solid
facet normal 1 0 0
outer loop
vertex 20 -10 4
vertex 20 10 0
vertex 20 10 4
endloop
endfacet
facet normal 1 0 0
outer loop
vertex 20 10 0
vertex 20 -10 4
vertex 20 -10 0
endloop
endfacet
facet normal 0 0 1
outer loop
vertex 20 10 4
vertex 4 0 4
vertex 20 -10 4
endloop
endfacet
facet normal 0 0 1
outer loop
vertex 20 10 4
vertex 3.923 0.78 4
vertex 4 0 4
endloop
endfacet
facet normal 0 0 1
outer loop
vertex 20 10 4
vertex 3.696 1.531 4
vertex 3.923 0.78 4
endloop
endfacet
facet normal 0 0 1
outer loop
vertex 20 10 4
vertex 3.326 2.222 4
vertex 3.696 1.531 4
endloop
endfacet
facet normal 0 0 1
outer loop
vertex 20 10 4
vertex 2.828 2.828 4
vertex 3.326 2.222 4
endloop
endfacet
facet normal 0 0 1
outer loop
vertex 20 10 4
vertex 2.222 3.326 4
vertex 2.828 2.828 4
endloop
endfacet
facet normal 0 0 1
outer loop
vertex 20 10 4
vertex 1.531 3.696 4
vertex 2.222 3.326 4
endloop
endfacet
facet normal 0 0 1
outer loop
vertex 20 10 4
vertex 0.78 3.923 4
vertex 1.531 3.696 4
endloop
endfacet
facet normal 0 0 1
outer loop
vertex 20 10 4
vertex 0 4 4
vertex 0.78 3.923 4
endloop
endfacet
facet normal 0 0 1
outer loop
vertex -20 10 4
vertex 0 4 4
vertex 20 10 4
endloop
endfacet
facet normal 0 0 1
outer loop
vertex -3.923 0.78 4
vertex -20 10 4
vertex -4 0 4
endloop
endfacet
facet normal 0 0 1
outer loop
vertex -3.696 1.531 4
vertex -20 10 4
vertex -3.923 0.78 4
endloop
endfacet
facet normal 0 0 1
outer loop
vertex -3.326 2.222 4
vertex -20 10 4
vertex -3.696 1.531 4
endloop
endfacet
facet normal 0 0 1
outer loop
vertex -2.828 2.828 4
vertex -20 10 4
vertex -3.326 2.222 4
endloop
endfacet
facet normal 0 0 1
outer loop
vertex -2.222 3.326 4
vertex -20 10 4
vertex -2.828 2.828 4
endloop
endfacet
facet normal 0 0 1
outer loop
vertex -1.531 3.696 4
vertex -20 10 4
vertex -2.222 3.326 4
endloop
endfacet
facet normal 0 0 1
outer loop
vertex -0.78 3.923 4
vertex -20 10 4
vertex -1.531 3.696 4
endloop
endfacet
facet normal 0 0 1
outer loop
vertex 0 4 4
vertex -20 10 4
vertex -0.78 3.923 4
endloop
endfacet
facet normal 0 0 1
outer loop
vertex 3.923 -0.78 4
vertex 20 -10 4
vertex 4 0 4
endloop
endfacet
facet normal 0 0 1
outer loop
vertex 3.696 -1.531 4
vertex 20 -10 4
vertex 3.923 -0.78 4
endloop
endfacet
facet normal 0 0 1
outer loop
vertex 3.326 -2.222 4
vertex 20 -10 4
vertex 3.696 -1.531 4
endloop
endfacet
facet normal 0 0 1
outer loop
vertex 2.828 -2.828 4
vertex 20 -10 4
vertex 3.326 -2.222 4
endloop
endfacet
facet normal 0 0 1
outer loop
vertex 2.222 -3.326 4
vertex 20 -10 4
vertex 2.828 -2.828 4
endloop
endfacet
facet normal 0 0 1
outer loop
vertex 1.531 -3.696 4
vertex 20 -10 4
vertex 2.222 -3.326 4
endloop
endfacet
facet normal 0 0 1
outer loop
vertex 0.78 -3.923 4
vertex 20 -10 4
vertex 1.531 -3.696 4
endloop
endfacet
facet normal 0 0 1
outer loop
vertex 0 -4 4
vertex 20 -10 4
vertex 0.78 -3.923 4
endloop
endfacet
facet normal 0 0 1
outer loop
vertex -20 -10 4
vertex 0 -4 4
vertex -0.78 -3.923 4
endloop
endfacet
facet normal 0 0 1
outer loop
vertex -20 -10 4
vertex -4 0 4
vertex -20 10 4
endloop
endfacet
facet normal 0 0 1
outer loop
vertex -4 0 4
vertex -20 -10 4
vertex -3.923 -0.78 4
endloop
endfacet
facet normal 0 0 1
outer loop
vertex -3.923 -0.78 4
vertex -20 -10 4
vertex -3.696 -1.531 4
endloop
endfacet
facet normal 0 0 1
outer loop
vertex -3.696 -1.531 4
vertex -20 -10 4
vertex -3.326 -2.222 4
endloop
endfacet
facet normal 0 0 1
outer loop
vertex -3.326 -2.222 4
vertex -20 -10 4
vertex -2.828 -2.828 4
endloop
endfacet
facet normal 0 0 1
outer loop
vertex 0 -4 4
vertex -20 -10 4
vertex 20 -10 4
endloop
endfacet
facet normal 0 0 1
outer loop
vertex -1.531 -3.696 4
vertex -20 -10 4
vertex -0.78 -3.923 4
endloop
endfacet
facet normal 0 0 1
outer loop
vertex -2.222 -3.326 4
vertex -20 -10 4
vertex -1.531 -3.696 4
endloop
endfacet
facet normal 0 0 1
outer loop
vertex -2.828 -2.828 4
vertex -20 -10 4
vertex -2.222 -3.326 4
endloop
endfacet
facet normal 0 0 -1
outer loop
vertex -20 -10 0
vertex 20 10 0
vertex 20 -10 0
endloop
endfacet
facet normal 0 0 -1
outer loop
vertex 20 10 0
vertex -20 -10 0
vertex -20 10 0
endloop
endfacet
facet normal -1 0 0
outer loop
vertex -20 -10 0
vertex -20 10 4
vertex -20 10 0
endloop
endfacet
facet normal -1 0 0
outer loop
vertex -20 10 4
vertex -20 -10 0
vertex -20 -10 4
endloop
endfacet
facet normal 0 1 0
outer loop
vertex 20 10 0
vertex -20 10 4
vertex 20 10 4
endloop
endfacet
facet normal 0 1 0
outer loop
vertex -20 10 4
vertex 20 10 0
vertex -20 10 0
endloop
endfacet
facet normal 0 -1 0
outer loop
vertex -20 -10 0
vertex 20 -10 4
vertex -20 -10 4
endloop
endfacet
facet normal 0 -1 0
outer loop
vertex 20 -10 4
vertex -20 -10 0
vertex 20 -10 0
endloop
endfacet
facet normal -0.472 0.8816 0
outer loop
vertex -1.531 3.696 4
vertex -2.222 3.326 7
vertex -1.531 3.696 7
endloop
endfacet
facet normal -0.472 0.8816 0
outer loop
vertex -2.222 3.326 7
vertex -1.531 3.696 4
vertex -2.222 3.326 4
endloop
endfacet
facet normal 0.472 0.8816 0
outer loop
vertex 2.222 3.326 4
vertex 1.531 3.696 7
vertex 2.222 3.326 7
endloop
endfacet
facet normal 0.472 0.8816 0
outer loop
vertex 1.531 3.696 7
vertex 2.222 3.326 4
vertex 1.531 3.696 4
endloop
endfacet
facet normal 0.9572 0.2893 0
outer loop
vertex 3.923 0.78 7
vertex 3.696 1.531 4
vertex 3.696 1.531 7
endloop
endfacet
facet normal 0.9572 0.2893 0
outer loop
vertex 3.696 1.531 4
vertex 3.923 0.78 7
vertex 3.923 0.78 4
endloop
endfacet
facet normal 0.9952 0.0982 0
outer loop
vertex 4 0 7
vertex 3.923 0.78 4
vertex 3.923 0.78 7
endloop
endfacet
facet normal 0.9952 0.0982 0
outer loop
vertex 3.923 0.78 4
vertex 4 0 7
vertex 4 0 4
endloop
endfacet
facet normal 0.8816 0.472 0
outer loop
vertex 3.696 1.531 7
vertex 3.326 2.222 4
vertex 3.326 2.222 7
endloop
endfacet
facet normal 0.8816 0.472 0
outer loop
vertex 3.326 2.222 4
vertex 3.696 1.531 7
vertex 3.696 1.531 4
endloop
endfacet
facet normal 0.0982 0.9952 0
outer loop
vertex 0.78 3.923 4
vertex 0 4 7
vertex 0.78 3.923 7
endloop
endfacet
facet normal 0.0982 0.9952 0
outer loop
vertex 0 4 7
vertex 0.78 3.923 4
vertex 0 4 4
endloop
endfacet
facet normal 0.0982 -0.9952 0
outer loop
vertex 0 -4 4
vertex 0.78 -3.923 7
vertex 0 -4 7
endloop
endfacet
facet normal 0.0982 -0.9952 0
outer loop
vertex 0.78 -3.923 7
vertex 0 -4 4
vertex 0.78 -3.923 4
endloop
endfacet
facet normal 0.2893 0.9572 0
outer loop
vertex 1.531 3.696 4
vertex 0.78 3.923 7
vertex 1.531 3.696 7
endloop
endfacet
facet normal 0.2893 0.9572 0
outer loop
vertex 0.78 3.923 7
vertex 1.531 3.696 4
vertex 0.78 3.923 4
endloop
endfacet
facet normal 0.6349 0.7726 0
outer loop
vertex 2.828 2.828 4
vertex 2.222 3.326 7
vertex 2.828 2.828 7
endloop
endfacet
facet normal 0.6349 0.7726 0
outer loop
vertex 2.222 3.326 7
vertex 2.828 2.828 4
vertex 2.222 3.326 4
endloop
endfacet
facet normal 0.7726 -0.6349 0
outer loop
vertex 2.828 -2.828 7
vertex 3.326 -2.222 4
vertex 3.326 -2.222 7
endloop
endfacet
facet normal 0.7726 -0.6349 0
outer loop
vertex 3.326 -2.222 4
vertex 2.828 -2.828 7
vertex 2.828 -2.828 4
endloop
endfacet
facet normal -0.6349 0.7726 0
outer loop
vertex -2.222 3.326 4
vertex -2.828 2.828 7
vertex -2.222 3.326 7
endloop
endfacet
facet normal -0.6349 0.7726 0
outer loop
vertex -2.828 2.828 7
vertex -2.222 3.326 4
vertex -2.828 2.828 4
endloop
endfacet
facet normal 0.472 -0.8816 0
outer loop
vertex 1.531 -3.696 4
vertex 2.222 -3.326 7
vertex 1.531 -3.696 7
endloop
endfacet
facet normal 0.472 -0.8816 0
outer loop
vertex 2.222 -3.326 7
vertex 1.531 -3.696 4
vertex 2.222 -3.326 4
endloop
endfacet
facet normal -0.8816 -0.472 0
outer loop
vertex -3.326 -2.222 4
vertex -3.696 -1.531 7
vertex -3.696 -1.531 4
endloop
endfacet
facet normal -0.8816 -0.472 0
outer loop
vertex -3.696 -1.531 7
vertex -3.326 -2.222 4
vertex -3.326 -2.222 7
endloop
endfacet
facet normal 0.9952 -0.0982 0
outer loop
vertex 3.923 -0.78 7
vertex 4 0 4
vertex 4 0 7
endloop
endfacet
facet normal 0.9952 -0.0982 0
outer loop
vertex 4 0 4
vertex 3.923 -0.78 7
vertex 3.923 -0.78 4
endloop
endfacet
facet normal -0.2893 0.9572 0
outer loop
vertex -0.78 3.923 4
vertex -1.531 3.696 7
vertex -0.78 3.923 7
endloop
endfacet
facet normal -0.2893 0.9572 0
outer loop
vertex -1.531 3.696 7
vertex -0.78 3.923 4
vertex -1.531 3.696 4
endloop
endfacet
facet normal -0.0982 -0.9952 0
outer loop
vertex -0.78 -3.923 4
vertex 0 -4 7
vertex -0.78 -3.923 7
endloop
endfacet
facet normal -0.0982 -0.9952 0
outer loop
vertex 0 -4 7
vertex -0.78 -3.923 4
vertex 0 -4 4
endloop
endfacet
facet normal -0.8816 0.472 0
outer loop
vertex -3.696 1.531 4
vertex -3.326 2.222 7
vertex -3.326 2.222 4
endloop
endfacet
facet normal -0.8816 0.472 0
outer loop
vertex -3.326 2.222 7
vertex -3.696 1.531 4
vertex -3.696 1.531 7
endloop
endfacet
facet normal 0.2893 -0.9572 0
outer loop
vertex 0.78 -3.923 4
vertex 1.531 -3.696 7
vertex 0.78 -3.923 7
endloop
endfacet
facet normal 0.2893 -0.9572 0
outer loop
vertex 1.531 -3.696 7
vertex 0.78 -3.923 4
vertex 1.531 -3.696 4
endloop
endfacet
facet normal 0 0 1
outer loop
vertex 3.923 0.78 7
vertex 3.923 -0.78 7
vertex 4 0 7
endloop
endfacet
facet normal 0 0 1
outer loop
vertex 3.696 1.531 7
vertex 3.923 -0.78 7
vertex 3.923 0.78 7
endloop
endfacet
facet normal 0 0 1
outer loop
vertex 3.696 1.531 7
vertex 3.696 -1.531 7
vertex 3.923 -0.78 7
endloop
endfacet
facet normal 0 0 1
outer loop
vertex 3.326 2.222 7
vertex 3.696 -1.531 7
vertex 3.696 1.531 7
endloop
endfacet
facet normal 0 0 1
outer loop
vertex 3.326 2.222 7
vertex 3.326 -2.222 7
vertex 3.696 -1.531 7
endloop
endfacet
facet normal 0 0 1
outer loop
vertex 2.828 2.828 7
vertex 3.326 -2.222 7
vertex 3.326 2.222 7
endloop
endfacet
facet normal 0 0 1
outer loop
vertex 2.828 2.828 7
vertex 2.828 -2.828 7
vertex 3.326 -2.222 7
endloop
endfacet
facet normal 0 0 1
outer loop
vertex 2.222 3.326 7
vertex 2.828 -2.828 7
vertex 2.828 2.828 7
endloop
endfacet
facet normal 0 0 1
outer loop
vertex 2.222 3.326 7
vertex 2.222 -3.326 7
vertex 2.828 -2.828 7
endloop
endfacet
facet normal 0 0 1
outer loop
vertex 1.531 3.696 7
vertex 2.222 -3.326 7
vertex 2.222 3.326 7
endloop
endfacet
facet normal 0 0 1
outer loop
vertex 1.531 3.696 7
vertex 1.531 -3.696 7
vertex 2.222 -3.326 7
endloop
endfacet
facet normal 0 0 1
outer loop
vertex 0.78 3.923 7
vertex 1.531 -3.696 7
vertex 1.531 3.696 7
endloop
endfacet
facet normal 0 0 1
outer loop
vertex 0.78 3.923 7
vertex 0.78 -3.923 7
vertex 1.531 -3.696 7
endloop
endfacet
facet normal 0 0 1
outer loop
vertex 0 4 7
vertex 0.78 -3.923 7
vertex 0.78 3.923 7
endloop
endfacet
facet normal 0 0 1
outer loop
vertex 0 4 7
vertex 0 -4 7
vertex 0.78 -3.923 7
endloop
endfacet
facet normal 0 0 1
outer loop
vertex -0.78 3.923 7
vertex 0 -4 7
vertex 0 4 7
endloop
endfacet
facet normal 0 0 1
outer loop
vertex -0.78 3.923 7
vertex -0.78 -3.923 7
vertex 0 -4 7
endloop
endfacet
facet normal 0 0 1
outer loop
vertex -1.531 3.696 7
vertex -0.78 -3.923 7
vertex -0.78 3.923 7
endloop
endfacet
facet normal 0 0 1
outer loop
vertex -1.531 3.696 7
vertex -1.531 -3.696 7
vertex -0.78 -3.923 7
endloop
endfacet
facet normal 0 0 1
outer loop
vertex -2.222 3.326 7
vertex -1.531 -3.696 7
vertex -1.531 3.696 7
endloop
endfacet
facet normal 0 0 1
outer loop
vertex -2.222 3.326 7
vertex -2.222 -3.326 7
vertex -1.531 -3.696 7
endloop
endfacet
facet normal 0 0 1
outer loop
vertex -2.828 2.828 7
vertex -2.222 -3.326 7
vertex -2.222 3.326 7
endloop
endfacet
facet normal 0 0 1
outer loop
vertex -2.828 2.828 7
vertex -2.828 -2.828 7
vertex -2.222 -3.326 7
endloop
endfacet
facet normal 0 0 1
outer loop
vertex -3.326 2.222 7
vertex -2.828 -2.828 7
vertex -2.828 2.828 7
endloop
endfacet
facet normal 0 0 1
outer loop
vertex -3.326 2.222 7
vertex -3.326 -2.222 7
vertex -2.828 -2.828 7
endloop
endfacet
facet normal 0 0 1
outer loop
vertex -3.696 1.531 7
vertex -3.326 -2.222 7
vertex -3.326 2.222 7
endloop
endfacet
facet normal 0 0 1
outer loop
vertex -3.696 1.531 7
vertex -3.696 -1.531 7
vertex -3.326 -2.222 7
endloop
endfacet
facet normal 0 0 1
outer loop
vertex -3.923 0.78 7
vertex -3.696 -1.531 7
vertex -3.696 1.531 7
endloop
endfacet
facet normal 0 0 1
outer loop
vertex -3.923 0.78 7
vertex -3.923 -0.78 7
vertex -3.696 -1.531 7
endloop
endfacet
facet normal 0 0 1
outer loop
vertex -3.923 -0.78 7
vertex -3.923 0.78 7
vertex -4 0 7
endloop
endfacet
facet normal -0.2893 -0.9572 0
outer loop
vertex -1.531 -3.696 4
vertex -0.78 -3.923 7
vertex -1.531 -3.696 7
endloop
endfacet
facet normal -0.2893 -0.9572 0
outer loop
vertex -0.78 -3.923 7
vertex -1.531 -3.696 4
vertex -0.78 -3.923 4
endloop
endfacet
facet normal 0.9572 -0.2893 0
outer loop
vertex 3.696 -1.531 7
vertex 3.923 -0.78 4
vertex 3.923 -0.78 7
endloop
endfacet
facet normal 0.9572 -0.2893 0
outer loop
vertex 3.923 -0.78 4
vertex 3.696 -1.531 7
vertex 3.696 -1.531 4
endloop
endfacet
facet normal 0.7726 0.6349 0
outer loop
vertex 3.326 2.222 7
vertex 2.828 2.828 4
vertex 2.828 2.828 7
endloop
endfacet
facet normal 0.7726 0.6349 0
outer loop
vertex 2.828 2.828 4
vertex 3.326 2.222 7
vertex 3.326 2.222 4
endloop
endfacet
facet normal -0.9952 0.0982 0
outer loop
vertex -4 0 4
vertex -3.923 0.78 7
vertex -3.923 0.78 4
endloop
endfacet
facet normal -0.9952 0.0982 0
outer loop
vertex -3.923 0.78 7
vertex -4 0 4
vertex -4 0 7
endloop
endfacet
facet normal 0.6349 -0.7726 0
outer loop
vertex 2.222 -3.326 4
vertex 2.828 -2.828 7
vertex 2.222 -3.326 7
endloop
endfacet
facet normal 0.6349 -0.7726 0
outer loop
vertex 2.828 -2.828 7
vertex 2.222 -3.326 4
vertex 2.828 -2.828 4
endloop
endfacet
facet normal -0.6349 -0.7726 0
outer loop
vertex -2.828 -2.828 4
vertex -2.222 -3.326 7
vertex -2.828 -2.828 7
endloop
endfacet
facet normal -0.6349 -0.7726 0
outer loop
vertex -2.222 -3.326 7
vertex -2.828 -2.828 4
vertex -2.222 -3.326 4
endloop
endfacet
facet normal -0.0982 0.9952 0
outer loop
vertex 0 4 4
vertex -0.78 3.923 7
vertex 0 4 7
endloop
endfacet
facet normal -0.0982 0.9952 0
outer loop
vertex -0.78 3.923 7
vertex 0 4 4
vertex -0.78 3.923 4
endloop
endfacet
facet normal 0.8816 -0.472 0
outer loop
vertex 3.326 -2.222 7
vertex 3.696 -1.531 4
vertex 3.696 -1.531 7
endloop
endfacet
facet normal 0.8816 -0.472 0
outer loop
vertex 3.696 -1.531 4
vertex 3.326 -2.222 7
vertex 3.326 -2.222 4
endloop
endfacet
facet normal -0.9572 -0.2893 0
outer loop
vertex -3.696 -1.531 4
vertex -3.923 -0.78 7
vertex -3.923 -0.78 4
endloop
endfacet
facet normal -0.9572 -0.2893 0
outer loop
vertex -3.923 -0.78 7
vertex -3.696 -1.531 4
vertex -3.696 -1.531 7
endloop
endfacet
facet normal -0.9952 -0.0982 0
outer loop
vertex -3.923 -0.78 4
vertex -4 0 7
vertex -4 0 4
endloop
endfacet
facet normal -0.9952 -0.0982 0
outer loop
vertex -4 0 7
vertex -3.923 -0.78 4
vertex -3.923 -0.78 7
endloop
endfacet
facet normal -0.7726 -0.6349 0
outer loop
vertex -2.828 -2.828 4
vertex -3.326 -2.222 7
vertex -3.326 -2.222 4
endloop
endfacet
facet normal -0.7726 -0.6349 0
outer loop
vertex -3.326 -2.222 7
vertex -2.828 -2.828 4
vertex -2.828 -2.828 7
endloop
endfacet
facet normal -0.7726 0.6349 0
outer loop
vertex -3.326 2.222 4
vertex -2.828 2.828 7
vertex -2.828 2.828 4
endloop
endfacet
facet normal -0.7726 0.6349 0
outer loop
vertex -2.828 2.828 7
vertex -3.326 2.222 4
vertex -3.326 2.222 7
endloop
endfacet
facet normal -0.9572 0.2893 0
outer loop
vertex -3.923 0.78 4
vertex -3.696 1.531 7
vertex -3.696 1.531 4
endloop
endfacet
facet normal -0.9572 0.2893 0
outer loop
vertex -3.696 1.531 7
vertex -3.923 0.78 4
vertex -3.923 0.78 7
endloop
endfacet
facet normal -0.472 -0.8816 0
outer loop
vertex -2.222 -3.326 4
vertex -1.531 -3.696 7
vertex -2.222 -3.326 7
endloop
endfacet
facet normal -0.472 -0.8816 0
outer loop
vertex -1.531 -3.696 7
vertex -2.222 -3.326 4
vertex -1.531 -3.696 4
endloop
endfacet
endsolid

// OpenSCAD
// Frozen test fixture for the Phase 1/2 param-override silent-bug class.
// A plate where `width` and `thickness` visibly shift the printed bbox,
// so an unapplied override produces a wrong-size STL instead of a crash
// (the exact failure mode openscad-wasm-prebuilt caused by ignoring -D
// flags). Test asserts bbox differs between the default and an override.
//
// Intentionally minimal — no library includes, no CSG — so the render
// is cheap and the test runs fast. Do not import from other models or
// rename without updating bug-regression.spec.ts.

$fn = 32;
PRINT_ANCHOR_BBOX = [40, 20, 4];

// === User-tunable parameters ===
width     = 40;  // @param number min=10 max=200 step=1 label="Width (mm)"
depth     = 20;  // @param number min=10 max=200 step=1 label="Depth (mm)"
thickness = 4;   // @param number min=1  max=20  step=0.5 label="Thickness (mm)"
boss      = 3;   // @param number min=0  max=10  step=0.5 label="Boss height (mm)"
// === Geometry ===

translate([-width / 2, -depth / 2, 0])
    cube([width, depth, thickness]);
cylinder(h = thickness + boss, d = 8);
